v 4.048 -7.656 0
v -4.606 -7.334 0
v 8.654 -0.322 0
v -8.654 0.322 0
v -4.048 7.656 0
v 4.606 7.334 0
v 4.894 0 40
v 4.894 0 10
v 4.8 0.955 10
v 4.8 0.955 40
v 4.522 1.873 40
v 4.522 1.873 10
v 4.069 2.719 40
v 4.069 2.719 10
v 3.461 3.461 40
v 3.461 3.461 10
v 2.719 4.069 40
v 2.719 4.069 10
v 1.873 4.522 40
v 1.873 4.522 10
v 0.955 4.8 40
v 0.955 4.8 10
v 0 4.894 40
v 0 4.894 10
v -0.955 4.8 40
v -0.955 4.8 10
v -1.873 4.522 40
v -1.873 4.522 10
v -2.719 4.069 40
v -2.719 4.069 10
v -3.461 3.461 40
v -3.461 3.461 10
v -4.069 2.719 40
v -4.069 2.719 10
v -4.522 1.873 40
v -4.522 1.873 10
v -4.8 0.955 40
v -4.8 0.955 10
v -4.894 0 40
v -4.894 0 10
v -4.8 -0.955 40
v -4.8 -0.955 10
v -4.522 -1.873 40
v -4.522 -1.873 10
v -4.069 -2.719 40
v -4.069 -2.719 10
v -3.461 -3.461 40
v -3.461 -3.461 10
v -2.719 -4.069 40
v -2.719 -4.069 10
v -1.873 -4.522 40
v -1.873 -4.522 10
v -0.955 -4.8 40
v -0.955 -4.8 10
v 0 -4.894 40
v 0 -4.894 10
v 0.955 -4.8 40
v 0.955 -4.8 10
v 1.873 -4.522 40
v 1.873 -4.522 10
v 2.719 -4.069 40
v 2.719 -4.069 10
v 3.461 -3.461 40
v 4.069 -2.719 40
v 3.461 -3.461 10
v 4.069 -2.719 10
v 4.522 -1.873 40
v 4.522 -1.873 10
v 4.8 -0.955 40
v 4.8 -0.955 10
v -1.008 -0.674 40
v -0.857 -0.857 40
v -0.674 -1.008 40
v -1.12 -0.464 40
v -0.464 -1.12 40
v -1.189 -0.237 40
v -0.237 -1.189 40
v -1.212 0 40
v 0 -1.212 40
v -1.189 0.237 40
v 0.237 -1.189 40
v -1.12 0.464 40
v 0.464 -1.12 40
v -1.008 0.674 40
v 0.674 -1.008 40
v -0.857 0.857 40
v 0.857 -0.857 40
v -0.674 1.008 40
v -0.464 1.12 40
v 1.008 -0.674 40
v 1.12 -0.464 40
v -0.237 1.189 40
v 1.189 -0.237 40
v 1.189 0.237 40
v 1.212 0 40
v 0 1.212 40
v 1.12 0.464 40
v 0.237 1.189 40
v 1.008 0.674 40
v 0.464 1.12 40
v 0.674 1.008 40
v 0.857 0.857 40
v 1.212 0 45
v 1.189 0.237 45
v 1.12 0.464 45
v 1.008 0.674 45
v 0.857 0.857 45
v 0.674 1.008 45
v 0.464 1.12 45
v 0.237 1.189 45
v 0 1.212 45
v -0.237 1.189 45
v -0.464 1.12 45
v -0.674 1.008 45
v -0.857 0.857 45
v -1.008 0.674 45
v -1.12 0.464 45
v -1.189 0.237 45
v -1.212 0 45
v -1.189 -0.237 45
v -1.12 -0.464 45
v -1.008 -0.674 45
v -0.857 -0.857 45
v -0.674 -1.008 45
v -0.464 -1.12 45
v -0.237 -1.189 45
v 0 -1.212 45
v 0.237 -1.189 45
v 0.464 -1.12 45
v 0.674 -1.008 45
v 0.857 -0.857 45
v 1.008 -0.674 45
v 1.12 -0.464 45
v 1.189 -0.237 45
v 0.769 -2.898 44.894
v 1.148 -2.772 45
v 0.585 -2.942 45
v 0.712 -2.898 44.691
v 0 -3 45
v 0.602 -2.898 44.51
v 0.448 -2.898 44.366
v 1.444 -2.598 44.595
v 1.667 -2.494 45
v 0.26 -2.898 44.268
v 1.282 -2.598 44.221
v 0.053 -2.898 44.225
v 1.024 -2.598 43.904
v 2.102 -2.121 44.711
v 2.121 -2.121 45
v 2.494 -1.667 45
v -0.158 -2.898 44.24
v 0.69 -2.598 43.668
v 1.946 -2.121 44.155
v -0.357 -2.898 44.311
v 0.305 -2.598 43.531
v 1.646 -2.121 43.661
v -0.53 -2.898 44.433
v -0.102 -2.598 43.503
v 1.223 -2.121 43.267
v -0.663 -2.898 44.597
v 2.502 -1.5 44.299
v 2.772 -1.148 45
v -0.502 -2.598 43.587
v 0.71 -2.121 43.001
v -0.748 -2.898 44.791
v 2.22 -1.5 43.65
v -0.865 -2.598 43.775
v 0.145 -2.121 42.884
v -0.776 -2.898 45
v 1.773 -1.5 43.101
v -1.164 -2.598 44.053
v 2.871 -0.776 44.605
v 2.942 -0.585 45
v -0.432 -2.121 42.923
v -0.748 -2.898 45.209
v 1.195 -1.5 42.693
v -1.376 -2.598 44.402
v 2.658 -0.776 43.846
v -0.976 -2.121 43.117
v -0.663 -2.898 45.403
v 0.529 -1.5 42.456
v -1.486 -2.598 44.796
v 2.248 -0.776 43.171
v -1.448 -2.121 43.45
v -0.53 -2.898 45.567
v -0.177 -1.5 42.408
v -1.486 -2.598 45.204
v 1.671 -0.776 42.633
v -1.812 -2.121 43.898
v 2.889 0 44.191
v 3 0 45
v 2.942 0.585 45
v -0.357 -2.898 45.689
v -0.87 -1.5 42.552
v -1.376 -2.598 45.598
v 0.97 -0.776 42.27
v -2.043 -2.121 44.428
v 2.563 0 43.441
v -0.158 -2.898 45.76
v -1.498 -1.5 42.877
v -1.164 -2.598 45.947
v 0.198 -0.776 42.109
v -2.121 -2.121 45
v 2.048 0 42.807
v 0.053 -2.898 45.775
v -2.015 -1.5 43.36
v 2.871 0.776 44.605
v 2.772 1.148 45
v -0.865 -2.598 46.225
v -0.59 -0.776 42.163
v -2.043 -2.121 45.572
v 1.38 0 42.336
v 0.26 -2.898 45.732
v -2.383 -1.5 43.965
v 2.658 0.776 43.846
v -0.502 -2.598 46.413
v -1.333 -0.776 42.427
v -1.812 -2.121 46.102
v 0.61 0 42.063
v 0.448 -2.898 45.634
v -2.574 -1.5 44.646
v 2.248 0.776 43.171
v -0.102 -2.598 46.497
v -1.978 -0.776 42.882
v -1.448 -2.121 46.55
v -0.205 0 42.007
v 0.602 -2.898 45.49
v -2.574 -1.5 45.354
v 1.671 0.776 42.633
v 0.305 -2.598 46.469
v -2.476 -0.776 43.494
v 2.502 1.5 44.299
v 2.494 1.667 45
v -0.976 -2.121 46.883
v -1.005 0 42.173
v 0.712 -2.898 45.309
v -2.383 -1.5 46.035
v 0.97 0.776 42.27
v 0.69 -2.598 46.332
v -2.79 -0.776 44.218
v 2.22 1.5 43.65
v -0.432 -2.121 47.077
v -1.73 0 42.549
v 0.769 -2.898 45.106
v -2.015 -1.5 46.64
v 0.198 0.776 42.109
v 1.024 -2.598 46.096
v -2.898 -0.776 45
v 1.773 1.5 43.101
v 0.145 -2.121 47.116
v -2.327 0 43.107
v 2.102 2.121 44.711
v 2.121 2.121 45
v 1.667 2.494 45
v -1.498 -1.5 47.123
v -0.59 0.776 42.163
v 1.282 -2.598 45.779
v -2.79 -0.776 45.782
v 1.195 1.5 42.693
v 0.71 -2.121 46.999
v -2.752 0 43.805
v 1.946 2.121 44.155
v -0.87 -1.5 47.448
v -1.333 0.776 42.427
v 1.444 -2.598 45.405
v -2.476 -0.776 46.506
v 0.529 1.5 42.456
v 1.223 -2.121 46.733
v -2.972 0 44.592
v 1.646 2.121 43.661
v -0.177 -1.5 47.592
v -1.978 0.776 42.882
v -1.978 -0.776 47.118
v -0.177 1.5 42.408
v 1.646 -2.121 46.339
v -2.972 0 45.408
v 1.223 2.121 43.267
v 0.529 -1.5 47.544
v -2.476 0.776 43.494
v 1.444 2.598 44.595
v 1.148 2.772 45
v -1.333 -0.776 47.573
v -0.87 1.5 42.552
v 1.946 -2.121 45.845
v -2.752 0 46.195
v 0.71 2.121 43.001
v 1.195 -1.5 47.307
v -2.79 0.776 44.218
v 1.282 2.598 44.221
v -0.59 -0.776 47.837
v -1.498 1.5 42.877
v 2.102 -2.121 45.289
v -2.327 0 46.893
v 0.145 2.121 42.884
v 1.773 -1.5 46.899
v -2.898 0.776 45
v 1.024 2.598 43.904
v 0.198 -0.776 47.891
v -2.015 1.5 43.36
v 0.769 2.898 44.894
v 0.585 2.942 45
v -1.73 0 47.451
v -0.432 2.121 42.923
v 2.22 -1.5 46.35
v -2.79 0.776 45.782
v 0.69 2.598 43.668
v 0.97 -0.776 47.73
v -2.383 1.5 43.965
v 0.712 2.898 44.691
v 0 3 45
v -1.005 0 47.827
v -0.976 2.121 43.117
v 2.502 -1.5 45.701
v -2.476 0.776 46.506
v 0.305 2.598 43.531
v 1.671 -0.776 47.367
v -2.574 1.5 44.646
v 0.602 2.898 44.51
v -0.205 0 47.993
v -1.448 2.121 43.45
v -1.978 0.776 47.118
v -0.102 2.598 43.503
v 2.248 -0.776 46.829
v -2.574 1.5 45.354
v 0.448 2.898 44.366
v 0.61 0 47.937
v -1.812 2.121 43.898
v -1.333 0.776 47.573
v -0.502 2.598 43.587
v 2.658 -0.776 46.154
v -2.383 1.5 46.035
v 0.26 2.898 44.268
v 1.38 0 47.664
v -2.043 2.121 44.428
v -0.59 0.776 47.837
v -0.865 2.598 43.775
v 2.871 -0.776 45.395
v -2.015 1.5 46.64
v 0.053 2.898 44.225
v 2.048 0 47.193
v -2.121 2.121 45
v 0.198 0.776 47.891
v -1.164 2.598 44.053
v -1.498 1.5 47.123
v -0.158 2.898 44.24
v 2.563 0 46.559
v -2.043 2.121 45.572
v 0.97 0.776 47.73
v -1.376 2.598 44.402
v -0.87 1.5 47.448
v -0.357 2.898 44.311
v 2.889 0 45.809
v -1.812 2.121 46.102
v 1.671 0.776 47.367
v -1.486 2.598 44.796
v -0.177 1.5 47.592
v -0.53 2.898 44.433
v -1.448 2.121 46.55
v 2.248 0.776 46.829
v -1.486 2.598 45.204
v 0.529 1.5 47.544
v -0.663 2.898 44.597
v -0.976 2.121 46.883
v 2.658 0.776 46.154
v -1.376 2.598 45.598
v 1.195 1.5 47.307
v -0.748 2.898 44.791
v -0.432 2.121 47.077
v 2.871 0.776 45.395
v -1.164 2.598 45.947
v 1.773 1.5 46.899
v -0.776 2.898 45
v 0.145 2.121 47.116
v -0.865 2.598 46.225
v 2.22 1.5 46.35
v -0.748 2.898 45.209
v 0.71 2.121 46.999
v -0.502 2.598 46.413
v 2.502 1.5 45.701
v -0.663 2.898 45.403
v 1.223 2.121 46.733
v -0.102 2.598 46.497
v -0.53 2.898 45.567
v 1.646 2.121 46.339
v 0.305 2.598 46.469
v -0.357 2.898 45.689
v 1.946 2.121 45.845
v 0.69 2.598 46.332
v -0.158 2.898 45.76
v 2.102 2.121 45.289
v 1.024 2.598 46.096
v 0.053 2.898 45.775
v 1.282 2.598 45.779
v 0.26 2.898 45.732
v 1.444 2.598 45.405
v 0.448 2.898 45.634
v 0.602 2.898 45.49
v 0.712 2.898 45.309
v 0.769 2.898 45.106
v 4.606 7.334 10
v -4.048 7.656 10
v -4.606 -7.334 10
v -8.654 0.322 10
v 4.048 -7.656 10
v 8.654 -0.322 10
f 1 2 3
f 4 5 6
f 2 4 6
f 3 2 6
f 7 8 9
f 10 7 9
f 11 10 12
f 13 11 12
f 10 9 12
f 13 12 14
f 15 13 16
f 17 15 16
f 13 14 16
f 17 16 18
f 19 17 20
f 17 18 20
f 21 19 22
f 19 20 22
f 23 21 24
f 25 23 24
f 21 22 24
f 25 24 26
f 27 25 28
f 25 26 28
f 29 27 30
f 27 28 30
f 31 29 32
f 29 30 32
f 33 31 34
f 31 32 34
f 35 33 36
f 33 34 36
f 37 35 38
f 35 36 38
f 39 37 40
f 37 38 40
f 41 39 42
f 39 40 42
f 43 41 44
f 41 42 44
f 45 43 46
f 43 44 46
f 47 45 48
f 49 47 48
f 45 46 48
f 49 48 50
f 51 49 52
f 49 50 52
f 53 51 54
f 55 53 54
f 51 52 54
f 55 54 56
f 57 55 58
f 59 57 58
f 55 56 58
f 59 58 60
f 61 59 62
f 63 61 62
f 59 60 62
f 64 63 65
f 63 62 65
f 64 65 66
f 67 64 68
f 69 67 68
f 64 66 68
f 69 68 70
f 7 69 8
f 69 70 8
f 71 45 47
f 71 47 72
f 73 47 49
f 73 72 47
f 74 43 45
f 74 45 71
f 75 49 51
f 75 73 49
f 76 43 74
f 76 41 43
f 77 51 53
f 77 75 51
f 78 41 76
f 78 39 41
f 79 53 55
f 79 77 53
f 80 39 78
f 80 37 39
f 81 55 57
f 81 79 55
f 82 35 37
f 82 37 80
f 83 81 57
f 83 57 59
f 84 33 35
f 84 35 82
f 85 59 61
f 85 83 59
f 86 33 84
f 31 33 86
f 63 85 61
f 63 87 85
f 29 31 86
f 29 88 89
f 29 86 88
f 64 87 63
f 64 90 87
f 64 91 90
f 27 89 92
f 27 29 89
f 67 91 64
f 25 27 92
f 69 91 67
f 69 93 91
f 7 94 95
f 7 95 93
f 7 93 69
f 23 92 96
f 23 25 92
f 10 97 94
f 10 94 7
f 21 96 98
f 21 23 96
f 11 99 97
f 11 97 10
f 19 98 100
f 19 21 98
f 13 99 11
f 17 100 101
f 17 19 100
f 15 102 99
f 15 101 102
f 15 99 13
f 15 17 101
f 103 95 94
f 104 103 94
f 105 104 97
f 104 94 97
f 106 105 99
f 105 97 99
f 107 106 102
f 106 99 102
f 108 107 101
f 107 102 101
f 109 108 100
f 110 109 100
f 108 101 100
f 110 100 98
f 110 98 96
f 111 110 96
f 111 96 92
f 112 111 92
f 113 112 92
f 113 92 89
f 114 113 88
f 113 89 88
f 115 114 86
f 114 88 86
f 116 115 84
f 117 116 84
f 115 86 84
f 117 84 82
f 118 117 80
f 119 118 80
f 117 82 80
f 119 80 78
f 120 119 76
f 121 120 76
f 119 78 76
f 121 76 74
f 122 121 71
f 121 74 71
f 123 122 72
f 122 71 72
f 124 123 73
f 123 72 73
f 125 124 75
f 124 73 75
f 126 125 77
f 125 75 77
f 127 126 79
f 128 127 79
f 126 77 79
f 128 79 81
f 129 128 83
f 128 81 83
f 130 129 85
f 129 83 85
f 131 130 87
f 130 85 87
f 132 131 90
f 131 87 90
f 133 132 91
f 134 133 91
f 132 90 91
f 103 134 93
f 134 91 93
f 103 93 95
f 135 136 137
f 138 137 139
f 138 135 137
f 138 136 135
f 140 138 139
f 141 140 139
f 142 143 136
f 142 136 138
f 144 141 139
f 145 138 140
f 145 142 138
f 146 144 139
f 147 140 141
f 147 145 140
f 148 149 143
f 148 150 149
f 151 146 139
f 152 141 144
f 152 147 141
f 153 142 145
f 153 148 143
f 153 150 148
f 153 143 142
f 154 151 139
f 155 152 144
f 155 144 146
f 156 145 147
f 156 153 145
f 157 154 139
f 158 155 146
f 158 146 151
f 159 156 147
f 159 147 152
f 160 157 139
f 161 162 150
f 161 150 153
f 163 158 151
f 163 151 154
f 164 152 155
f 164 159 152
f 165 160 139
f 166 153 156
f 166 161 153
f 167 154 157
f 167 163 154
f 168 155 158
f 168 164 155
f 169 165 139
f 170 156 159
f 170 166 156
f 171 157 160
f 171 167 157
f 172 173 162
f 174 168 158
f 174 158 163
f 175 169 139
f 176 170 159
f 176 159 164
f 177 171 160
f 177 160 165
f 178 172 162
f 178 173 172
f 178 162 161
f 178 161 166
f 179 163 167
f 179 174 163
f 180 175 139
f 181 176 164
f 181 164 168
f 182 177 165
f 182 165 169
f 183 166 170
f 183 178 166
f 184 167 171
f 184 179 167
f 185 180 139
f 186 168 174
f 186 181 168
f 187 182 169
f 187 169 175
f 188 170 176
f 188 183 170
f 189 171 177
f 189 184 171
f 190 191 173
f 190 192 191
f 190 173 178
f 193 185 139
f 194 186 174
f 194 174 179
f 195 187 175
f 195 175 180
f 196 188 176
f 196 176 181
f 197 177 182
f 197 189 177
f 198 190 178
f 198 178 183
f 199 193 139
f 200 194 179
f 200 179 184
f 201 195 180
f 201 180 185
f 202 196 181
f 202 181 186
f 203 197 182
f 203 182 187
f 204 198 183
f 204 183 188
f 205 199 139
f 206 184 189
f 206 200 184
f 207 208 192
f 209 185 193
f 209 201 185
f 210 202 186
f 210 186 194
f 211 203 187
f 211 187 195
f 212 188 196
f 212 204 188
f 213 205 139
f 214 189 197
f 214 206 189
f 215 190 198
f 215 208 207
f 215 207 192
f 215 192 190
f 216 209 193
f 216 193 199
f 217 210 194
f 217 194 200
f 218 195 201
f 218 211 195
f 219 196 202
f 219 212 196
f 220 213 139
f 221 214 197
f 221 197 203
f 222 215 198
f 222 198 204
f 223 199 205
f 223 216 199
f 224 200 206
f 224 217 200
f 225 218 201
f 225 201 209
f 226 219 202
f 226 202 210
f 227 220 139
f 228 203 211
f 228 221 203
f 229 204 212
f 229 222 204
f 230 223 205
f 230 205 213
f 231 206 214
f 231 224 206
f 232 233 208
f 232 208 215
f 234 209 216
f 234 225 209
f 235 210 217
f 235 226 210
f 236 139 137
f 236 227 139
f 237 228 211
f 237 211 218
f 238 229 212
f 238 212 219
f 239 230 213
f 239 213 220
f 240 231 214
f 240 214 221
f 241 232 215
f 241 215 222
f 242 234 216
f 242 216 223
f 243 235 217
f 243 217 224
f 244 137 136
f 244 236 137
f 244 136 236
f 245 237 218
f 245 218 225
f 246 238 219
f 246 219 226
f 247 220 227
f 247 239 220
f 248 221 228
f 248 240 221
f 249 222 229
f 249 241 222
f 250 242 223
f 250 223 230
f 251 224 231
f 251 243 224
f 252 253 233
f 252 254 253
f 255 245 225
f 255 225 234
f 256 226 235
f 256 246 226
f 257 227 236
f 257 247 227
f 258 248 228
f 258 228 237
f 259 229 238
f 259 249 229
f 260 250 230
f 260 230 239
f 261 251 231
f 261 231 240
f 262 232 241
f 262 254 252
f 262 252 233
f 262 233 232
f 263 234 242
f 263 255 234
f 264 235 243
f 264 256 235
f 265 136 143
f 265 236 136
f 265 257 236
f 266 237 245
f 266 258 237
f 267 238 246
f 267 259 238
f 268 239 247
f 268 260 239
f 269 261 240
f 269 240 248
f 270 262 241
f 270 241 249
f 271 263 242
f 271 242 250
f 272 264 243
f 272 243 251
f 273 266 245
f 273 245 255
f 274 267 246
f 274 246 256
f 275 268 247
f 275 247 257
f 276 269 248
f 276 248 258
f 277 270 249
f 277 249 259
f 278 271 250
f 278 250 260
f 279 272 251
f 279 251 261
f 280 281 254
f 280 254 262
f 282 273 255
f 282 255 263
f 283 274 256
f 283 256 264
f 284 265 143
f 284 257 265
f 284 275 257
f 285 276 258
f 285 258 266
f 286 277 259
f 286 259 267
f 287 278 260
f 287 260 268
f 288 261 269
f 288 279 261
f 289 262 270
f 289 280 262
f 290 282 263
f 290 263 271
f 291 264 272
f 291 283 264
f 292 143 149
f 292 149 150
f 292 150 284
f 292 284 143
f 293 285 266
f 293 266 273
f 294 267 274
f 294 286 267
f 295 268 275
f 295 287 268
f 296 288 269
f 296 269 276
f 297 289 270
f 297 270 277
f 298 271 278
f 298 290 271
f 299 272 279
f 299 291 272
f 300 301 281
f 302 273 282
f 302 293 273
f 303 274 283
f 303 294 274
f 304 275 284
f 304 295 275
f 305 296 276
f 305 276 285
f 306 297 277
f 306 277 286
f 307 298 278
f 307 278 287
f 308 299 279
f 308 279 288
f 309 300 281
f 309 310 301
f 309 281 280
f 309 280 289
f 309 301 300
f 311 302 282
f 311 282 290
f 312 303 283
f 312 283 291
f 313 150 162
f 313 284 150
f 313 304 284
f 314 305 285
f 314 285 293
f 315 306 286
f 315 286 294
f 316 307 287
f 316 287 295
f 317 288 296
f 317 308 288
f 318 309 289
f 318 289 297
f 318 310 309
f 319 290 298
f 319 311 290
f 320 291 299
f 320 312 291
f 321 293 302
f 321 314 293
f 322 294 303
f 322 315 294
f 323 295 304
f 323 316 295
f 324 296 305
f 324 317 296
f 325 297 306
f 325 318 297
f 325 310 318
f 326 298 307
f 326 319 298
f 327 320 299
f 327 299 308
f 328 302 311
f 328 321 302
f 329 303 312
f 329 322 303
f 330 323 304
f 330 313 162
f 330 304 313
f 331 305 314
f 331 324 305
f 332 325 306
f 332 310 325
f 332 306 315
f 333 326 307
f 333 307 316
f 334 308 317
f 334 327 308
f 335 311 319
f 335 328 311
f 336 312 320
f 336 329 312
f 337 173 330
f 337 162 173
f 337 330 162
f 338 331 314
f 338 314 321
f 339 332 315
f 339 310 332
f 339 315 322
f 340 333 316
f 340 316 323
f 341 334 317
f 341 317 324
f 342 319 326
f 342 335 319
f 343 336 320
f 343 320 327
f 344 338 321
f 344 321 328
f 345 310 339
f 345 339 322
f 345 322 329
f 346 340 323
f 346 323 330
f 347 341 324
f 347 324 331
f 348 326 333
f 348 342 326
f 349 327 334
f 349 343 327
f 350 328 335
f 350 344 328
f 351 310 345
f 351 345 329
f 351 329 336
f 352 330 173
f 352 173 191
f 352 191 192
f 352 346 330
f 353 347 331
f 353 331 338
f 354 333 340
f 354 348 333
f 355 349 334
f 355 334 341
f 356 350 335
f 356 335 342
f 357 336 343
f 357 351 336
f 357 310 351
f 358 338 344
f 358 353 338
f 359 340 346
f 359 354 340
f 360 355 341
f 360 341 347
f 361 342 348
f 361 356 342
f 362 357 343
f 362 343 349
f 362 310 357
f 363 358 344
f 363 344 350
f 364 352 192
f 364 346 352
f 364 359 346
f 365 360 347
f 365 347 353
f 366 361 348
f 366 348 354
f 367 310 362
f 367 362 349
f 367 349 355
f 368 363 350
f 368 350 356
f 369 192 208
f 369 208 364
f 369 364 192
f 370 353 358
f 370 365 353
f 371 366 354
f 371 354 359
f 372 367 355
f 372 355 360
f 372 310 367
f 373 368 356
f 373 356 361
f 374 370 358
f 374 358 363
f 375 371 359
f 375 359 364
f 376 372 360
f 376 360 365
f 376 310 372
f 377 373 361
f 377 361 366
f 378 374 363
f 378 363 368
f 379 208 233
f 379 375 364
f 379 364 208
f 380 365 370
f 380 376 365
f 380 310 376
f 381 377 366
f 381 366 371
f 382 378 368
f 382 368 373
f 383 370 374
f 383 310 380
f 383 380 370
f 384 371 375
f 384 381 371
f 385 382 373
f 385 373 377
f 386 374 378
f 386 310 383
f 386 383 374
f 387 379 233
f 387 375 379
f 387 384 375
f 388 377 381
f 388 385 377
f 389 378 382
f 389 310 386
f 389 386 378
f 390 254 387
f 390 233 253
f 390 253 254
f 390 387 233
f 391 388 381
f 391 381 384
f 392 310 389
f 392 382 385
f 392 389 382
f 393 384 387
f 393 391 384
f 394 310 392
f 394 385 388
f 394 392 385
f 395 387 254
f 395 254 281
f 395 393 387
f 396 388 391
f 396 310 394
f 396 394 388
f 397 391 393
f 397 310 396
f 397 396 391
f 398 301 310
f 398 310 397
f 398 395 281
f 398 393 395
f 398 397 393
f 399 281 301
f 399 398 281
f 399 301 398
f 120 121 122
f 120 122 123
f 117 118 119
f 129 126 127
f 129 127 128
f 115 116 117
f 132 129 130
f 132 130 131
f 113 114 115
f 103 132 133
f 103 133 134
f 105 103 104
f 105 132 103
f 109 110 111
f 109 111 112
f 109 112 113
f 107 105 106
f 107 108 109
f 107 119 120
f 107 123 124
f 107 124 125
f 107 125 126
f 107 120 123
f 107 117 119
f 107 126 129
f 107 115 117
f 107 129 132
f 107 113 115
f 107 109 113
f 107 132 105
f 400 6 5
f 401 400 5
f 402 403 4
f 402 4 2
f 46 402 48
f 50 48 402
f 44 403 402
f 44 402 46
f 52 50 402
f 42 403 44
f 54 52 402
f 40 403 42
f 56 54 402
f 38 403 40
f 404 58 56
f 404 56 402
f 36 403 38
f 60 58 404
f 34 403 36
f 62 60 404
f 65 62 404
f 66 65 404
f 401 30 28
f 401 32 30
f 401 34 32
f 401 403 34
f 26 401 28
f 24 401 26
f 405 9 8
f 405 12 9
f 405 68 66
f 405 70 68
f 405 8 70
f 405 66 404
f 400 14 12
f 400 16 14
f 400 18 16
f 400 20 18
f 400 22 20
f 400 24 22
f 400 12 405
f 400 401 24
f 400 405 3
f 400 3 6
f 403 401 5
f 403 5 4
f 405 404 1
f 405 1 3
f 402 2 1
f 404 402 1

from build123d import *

# Parameters (mm, degrees)
BOSS_EXTRU_1_DEPTH = 10
BOSS_EXTRU_2_DEPTH = 10
ESQUISSE2_R        = 4.894055533
BOSS_EXTRU_3_DEPTH = 30
ESQUISSE3_R        = 1.212326076
BOSS_EXTRU_4_DEPTH = 5


with BuildPart() as part:
    # Esquisse1 → Boss.-Extru.1 (new body)
    with BuildSketch(Plane.XY):
        Polygon((4.048384121, -7.655755091), (8.654270454, -0.321874053), (4.605886333, 7.333881038), (-4.048384121, 7.655755091), (-8.654270454, 0.321874053), (-4.605886333, -7.333881038), align=None)
    extrude(amount=BOSS_EXTRU_1_DEPTH)

    # Esquisse1<2> → Boss.-Extru.2 (add)
    with BuildSketch(Plane.XY):
        Polygon((4.048384121, -7.655755091), (8.654270454, -0.321874053), (4.605886333, 7.333881038), (-4.048384121, 7.655755091), (-8.654270454, 0.321874053), (-4.605886333, -7.333881038), align=None)
    extrude(amount=BOSS_EXTRU_2_DEPTH)

    # Esquisse2 → Boss.-Extru.3 (add)
    with BuildSketch(Plane.XY.offset(10)):
        Circle(ESQUISSE2_R)
    extrude(amount=BOSS_EXTRU_3_DEPTH)

    # Esquisse3 → Boss.-Extru.4 (add)
    with BuildSketch(Plane.XY.offset(40)):
        Circle(ESQUISSE3_R)
    extrude(amount=BOSS_EXTRU_4_DEPTH)


with BuildPart() as body_2:
    # Esquisse4 → Révolution2 (revolve)
    with BuildSketch(Plane.XY.offset(45)):
        with BuildLine():
            Line((0, 3), (0, -3))
            ThreePointArc((0, -3), (3, 0), (0, 3))
        make_face()
    revolve(axis=Axis((0, 0, 45), (0, 1, 0)))


solid = Compound([part.part, body_2.part])
